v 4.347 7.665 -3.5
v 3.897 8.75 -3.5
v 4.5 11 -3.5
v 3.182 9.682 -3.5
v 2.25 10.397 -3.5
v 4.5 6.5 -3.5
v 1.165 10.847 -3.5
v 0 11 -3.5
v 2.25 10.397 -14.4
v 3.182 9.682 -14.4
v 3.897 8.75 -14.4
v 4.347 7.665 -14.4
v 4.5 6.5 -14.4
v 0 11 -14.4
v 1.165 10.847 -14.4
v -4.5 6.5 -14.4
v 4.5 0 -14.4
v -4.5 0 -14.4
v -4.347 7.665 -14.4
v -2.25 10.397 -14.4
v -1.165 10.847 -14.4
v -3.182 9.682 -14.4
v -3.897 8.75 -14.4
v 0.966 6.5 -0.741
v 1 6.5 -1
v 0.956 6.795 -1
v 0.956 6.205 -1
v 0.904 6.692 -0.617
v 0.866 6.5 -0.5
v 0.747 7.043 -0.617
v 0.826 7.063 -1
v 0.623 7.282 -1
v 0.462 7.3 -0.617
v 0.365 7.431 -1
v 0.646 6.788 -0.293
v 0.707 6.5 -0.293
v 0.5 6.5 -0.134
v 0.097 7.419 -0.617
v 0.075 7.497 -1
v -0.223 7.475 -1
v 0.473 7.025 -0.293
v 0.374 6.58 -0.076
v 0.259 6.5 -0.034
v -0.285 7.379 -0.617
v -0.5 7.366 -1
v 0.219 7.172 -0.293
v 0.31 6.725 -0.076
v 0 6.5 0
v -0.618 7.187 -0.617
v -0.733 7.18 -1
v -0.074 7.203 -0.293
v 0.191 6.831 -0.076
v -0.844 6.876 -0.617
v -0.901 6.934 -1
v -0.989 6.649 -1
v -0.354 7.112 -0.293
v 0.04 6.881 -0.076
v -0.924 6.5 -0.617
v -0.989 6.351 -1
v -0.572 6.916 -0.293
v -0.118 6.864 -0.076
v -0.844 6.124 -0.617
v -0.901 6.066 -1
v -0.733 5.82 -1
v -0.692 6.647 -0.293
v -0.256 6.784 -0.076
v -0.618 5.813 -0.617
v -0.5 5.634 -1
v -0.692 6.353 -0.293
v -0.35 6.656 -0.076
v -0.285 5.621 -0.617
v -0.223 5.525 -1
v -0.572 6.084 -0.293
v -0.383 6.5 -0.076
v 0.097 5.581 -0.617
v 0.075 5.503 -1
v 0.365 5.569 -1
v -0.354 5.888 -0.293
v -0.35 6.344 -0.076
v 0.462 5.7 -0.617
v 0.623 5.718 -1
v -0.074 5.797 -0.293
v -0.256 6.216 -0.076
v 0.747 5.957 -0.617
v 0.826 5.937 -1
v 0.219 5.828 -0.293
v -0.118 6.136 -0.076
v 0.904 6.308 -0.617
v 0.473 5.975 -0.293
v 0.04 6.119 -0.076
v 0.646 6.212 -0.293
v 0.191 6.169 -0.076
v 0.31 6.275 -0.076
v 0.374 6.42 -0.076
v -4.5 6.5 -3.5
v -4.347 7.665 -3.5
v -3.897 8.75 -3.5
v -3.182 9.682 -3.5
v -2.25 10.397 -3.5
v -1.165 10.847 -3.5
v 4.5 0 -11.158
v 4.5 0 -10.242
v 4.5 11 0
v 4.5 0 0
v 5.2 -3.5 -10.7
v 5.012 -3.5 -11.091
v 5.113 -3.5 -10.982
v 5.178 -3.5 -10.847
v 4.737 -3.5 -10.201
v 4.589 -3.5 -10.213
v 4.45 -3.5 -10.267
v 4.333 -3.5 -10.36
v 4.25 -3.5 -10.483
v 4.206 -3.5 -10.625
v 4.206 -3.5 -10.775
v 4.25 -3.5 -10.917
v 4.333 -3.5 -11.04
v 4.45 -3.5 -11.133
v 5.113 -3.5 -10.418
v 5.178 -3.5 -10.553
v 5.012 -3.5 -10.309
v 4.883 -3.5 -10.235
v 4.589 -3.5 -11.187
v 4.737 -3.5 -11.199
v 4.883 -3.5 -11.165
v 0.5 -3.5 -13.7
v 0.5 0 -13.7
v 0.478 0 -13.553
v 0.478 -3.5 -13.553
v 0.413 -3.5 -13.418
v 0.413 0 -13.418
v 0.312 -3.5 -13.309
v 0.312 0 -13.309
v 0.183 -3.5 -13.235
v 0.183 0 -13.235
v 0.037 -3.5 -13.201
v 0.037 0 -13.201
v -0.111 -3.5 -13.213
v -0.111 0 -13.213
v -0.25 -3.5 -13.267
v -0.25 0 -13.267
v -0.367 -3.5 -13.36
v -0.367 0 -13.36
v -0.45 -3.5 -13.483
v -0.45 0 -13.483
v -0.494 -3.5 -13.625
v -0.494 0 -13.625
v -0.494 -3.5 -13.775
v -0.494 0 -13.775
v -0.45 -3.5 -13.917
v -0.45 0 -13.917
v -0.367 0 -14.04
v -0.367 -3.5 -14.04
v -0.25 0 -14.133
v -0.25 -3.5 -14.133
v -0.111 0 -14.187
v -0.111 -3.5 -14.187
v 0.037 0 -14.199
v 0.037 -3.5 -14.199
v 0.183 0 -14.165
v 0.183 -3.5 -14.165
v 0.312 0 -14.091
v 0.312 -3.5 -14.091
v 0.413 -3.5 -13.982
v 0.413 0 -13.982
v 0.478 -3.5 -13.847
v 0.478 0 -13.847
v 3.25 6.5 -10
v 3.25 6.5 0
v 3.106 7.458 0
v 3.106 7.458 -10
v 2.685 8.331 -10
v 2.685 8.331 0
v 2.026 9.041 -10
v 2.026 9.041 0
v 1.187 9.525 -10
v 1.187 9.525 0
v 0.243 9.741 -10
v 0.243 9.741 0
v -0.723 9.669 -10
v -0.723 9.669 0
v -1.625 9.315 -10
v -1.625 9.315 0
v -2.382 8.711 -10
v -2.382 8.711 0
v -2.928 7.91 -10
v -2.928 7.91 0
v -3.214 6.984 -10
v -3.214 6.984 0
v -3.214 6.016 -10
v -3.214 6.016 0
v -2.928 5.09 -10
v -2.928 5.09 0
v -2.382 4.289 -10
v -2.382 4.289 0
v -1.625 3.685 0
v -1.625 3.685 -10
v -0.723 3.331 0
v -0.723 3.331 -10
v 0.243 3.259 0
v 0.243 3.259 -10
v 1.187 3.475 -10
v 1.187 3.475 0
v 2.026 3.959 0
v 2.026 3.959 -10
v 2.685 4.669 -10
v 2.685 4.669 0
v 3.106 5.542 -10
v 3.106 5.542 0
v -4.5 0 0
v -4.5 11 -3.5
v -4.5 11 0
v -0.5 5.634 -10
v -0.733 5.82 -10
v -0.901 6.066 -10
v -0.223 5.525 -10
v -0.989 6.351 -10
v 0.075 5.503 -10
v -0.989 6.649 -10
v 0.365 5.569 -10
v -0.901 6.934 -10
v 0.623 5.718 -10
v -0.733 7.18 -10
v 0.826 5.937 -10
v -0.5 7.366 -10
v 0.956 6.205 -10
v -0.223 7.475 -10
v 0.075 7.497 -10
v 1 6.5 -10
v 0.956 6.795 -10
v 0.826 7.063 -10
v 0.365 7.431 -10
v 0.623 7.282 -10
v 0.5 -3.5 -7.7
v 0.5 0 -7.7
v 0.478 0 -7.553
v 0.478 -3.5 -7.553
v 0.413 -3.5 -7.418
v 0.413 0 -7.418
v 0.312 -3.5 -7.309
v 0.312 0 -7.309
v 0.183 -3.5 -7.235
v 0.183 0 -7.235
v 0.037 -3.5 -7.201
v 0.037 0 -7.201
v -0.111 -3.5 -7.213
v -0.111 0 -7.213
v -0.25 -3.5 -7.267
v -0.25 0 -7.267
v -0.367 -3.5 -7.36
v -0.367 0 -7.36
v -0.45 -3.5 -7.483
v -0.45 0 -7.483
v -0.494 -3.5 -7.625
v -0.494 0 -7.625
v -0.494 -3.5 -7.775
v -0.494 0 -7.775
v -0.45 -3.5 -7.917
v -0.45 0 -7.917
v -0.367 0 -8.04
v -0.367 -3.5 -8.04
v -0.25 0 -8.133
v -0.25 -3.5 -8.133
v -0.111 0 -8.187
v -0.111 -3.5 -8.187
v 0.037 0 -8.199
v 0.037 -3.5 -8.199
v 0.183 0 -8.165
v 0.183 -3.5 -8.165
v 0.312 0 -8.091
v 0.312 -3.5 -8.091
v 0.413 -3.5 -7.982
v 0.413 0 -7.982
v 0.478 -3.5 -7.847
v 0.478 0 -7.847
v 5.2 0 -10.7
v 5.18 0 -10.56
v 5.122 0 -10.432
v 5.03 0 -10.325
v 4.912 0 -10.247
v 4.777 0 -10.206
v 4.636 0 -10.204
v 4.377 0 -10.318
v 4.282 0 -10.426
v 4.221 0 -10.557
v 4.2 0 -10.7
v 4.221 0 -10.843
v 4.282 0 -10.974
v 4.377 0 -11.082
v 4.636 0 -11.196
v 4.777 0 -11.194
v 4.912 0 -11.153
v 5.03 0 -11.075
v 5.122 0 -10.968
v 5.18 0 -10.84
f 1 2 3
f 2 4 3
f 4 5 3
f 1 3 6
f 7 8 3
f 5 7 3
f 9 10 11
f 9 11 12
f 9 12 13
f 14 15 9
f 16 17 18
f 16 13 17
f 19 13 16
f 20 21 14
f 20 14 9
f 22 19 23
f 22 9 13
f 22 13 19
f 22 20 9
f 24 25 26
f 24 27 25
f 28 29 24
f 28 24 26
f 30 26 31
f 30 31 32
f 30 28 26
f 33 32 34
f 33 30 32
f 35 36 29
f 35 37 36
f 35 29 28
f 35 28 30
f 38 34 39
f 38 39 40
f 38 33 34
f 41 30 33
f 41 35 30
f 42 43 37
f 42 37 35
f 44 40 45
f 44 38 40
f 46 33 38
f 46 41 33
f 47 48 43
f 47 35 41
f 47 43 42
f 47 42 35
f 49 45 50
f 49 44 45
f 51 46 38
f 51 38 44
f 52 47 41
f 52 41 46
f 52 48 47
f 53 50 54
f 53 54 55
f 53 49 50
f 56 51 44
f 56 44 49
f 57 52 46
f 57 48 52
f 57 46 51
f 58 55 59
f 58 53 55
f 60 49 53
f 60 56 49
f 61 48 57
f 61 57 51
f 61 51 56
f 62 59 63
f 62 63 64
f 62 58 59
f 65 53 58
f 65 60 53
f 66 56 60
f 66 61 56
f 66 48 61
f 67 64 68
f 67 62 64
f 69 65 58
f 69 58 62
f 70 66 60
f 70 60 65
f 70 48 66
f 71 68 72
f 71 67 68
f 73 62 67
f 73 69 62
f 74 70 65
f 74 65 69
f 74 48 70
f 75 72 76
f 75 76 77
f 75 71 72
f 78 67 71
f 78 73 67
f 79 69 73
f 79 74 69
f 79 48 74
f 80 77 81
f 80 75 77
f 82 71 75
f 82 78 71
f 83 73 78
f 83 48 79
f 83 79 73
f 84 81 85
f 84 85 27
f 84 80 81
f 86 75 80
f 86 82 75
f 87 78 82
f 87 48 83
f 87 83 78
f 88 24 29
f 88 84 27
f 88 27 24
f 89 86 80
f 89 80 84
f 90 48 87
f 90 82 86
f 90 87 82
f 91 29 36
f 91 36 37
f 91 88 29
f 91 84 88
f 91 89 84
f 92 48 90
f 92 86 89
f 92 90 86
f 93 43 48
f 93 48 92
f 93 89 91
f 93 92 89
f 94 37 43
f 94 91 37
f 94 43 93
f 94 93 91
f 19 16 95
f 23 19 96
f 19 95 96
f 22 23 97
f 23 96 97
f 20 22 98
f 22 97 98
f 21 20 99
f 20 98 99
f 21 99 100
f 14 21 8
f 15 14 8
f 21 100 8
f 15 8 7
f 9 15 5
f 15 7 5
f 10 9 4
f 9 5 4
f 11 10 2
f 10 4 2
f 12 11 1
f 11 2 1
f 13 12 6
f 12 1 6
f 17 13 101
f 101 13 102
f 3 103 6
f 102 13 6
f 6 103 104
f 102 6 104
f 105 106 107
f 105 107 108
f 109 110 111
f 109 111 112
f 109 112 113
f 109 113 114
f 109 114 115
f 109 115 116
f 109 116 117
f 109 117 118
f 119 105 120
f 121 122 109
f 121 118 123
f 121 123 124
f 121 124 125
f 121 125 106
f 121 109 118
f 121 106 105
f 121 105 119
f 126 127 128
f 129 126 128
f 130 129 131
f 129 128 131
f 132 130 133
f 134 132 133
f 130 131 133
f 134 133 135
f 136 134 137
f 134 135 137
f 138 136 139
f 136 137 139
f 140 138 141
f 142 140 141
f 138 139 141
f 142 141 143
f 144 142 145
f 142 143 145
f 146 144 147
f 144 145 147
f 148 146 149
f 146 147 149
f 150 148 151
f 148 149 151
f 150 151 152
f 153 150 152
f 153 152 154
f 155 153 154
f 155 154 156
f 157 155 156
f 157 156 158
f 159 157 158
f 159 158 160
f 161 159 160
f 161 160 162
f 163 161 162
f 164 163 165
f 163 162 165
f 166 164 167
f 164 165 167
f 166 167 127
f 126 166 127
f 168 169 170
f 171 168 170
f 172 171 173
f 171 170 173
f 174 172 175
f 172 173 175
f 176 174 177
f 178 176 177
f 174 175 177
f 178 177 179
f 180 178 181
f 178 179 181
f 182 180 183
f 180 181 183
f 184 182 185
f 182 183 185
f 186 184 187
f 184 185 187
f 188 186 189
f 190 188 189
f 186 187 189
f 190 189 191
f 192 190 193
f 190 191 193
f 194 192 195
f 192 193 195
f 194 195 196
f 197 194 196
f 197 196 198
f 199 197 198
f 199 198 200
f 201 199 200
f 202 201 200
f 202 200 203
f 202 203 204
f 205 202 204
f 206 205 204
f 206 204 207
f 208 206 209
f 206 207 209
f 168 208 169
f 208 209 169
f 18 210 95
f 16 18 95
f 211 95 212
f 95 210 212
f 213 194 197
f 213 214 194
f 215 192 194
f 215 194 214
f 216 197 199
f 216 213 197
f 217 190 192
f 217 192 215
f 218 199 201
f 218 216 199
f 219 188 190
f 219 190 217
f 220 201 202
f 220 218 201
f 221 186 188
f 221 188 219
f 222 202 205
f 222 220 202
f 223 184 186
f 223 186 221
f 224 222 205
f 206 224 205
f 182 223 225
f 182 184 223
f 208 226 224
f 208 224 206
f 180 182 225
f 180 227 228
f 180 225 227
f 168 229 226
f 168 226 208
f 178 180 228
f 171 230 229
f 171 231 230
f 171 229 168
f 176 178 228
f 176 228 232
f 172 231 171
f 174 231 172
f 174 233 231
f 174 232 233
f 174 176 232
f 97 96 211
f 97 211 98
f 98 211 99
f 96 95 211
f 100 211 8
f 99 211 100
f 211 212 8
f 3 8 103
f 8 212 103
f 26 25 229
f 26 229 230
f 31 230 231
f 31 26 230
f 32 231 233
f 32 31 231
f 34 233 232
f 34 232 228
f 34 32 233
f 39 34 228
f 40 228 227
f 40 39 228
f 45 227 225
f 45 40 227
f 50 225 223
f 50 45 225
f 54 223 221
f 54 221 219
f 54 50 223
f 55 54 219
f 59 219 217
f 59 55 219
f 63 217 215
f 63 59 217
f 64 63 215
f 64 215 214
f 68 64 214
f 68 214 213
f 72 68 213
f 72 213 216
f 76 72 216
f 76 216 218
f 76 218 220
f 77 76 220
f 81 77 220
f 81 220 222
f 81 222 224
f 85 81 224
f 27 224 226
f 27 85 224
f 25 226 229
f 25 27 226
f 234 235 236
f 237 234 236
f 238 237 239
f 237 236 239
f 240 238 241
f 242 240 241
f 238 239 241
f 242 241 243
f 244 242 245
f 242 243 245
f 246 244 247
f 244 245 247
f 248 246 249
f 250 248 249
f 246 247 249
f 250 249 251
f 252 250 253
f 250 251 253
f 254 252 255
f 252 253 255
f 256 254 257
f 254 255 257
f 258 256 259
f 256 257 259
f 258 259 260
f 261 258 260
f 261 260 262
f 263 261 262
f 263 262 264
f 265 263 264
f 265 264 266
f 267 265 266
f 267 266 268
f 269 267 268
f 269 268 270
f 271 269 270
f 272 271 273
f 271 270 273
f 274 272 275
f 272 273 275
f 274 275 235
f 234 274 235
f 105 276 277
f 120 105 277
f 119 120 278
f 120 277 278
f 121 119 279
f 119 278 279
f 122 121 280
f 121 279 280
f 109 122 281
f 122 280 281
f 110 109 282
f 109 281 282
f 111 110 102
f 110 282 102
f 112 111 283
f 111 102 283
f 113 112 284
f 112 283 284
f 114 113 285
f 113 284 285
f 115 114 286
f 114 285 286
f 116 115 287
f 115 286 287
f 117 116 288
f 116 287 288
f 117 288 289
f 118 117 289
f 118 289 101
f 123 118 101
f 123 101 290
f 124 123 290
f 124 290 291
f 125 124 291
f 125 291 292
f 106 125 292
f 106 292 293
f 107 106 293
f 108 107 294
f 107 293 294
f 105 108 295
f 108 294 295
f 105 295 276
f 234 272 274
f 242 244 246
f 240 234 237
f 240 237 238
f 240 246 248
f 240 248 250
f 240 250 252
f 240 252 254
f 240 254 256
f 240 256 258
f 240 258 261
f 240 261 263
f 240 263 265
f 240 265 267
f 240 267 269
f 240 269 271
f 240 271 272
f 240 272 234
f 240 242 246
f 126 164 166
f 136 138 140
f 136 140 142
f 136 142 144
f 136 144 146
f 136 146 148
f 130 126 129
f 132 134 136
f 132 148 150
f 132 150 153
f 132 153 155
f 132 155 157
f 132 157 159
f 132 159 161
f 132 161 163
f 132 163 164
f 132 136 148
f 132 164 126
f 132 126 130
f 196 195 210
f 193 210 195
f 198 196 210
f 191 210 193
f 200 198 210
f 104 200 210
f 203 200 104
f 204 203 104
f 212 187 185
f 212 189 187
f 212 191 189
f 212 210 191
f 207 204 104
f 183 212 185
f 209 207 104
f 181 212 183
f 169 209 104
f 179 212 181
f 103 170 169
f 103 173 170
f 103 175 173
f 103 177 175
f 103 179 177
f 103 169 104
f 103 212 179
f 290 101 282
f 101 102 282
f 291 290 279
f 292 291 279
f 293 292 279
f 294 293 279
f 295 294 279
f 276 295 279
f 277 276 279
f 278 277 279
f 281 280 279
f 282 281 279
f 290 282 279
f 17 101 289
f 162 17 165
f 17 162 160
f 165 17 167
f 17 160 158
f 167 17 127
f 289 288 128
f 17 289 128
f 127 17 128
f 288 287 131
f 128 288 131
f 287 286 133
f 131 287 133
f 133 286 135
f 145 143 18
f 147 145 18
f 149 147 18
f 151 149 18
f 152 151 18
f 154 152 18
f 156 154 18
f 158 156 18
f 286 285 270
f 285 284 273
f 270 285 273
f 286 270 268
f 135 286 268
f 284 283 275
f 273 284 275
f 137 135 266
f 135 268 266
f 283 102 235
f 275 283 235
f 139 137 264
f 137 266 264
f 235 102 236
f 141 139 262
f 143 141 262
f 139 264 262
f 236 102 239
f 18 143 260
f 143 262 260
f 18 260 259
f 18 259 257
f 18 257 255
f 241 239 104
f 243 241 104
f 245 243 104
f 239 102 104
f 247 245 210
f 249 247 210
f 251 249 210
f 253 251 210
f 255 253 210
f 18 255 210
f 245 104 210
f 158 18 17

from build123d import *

# Parameters (mm, degrees)
BOSS_EXTRUDE1_DEPTH = 14.4
SKETCH3_W           = 9
SKETCH3_H           = 4.5
BOSS_EXTRUDE2_DEPTH = 3.5
SKETCH2_R           = 3.25
SKETCH2_R_2         = 1
CUT_EXTRUDE1_DEPTH  = 10
FILLET1_R           = 1
SKETCH4_R           = 0.5
BOSS_EXTRUDE3_DEPTH = 3.5


with BuildPart() as part:
    # Sketch1 → Boss-Extrude1 (new body)
    with BuildSketch(Plane.XY):
        with BuildLine():
            Line((4.5, 0), (-4.5, 0))
            Line((-4.5, 0), (-4.5, 6.5))
            ThreePointArc((-4.5, 6.5), (0, 11), (4.5, 6.5))
            Line((4.5, 6.5), (4.5, 0))
        make_face()
    extrude(amount=-BOSS_EXTRUDE1_DEPTH)

    # Sketch3 → Boss-Extrude2 (add)
    with BuildSketch(Plane.XY):
        with Locations((0, 8.75)):
            Rectangle(SKETCH3_W, SKETCH3_H)
    extrude(amount=-BOSS_EXTRUDE2_DEPTH)

    # Sketch2 → Cut-Extrude1 (cut)
    with BuildSketch(Plane.XY):
        with Locations((0, 6.5)):
            Circle(SKETCH2_R)
        with Locations((0, 6.5)):
            Circle(SKETCH2_R_2, mode=Mode.SUBTRACT)
    extrude(amount=-CUT_EXTRUDE1_DEPTH, mode=Mode.SUBTRACT)

    # Fillet1
    fillet1_edges = [part.edges().sort_by_distance(p)[0] for p in [
        (-1, 6.5, 0),
    ]]
    fillet(fillet1_edges, radius=FILLET1_R)

    # Sketch4 → Boss-Extrude3 (add)
    with BuildSketch(Plane.XZ):
        with Locations((0, -13.7)):
            Circle(SKETCH4_R)
        with Locations((0, -7.7)):
            Circle(SKETCH4_R)
        with Locations((4.7, -10.7)):
            Circle(SKETCH4_R)
    extrude(amount=BOSS_EXTRUDE3_DEPTH)


solid = part.part
